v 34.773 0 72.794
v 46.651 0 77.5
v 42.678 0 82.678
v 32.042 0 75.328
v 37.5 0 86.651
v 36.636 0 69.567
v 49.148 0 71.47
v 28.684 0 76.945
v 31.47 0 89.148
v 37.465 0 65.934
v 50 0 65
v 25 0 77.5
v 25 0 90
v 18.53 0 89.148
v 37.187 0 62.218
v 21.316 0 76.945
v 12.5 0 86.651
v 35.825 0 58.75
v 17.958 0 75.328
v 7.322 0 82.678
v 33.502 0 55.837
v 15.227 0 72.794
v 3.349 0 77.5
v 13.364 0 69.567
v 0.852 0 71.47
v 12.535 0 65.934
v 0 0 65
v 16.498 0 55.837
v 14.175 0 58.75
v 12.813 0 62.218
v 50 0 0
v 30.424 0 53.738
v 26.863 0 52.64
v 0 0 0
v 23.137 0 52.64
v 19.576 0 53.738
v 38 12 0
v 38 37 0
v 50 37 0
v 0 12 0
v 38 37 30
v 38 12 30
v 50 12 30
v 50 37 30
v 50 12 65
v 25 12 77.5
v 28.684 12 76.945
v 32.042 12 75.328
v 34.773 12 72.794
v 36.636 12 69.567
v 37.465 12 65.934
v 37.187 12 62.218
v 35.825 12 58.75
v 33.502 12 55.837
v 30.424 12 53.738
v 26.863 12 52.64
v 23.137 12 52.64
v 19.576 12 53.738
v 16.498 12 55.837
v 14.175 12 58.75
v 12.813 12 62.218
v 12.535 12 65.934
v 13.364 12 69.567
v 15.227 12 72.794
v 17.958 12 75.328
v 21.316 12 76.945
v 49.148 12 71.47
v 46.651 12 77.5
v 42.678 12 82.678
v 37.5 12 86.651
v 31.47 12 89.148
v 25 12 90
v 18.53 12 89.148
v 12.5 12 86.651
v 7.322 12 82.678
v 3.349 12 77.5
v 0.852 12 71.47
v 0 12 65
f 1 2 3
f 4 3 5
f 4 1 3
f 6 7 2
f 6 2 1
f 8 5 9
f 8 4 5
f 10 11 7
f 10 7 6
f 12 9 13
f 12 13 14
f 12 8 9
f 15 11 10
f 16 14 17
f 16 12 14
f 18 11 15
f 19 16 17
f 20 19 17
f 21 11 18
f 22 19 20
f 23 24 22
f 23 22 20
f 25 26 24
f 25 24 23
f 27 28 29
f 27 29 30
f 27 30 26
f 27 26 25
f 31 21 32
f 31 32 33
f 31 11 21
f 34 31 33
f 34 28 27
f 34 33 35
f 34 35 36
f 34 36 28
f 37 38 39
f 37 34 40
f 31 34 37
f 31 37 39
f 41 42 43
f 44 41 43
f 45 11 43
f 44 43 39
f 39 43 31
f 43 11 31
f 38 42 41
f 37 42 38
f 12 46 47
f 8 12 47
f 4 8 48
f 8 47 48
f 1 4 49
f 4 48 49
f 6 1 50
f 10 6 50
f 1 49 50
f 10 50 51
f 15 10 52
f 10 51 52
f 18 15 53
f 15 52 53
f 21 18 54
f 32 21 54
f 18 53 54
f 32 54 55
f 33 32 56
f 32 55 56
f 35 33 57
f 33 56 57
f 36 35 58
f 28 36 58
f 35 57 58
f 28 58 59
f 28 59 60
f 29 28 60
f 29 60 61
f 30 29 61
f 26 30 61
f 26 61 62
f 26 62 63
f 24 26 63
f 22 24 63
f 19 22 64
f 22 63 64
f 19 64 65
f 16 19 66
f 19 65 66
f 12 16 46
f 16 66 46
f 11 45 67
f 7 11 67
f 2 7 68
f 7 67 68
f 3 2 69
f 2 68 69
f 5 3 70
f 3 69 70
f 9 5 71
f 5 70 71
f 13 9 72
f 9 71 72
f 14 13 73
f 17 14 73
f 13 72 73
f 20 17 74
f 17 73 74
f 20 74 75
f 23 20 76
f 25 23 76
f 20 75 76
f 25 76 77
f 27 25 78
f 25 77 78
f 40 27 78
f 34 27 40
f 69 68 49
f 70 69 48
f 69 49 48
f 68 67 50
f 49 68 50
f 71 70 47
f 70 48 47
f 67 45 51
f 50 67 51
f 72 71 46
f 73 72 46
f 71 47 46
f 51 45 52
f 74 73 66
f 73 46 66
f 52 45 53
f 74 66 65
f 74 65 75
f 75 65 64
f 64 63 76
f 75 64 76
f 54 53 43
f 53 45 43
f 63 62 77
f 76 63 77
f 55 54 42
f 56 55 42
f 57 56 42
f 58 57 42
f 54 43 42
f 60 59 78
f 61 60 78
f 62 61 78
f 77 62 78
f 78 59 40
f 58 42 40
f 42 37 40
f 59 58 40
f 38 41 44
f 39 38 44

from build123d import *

# Parameters (mm, degrees)
SKETCH2_W           = 50
SKETCH2_H           = 65
BOSS_EXTRUDE1_DEPTH = 12
BOSS_EXTRUDE2_DEPTH = 12
SKETCH5_R           = 12.5
CUT_EXTRUDE1_DEPTH  = 12
SKETCH7_W           = 12
SKETCH7_H           = 30
BOSS_EXTRUDE3_DEPTH = 25


with BuildPart() as part:
    # Sketch2 → Boss-Extrude1 (new body)
    with BuildSketch(Plane(origin=(0, 0, 0), x_dir=(1, 0, 0), z_dir=(0, 1, 0))):
        with Locations((25, -32.5)):
            Rectangle(SKETCH2_W, SKETCH2_H)
    extrude(amount=BOSS_EXTRUDE1_DEPTH)

    # Sketch3 → Boss-Extrude2 (add)
    with BuildSketch(Plane(origin=(0, 12, 0), x_dir=(1, 0, 0), z_dir=(0, 1, 0))):
        with BuildLine():
            Line((0, -65), (50, -65))
            ThreePointArc((50, -65), (25, -90), (0, -65))
        make_face()
    extrude(amount=-BOSS_EXTRUDE2_DEPTH)

    # Sketch5 → Cut-Extrude1 (cut)
    with BuildSketch(Plane(origin=(0, 12, 0), x_dir=(1, 0, 0), z_dir=(0, 1, 0))):
        with Locations(Location((25, -65, 0), (0, 0, 270))):
            Circle(SKETCH5_R)
    extrude(amount=-CUT_EXTRUDE1_DEPTH, mode=Mode.SUBTRACT)

    # Sketch7 → Boss-Extrude3 (add)
    with BuildSketch(Plane(origin=(0, 12, 0), x_dir=(1, 0, 0), z_dir=(0, 1, 0))):
        with Locations((44, -15)):
            Rectangle(SKETCH7_W, SKETCH7_H)
    extrude(amount=BOSS_EXTRUDE3_DEPTH)


solid = part.part
